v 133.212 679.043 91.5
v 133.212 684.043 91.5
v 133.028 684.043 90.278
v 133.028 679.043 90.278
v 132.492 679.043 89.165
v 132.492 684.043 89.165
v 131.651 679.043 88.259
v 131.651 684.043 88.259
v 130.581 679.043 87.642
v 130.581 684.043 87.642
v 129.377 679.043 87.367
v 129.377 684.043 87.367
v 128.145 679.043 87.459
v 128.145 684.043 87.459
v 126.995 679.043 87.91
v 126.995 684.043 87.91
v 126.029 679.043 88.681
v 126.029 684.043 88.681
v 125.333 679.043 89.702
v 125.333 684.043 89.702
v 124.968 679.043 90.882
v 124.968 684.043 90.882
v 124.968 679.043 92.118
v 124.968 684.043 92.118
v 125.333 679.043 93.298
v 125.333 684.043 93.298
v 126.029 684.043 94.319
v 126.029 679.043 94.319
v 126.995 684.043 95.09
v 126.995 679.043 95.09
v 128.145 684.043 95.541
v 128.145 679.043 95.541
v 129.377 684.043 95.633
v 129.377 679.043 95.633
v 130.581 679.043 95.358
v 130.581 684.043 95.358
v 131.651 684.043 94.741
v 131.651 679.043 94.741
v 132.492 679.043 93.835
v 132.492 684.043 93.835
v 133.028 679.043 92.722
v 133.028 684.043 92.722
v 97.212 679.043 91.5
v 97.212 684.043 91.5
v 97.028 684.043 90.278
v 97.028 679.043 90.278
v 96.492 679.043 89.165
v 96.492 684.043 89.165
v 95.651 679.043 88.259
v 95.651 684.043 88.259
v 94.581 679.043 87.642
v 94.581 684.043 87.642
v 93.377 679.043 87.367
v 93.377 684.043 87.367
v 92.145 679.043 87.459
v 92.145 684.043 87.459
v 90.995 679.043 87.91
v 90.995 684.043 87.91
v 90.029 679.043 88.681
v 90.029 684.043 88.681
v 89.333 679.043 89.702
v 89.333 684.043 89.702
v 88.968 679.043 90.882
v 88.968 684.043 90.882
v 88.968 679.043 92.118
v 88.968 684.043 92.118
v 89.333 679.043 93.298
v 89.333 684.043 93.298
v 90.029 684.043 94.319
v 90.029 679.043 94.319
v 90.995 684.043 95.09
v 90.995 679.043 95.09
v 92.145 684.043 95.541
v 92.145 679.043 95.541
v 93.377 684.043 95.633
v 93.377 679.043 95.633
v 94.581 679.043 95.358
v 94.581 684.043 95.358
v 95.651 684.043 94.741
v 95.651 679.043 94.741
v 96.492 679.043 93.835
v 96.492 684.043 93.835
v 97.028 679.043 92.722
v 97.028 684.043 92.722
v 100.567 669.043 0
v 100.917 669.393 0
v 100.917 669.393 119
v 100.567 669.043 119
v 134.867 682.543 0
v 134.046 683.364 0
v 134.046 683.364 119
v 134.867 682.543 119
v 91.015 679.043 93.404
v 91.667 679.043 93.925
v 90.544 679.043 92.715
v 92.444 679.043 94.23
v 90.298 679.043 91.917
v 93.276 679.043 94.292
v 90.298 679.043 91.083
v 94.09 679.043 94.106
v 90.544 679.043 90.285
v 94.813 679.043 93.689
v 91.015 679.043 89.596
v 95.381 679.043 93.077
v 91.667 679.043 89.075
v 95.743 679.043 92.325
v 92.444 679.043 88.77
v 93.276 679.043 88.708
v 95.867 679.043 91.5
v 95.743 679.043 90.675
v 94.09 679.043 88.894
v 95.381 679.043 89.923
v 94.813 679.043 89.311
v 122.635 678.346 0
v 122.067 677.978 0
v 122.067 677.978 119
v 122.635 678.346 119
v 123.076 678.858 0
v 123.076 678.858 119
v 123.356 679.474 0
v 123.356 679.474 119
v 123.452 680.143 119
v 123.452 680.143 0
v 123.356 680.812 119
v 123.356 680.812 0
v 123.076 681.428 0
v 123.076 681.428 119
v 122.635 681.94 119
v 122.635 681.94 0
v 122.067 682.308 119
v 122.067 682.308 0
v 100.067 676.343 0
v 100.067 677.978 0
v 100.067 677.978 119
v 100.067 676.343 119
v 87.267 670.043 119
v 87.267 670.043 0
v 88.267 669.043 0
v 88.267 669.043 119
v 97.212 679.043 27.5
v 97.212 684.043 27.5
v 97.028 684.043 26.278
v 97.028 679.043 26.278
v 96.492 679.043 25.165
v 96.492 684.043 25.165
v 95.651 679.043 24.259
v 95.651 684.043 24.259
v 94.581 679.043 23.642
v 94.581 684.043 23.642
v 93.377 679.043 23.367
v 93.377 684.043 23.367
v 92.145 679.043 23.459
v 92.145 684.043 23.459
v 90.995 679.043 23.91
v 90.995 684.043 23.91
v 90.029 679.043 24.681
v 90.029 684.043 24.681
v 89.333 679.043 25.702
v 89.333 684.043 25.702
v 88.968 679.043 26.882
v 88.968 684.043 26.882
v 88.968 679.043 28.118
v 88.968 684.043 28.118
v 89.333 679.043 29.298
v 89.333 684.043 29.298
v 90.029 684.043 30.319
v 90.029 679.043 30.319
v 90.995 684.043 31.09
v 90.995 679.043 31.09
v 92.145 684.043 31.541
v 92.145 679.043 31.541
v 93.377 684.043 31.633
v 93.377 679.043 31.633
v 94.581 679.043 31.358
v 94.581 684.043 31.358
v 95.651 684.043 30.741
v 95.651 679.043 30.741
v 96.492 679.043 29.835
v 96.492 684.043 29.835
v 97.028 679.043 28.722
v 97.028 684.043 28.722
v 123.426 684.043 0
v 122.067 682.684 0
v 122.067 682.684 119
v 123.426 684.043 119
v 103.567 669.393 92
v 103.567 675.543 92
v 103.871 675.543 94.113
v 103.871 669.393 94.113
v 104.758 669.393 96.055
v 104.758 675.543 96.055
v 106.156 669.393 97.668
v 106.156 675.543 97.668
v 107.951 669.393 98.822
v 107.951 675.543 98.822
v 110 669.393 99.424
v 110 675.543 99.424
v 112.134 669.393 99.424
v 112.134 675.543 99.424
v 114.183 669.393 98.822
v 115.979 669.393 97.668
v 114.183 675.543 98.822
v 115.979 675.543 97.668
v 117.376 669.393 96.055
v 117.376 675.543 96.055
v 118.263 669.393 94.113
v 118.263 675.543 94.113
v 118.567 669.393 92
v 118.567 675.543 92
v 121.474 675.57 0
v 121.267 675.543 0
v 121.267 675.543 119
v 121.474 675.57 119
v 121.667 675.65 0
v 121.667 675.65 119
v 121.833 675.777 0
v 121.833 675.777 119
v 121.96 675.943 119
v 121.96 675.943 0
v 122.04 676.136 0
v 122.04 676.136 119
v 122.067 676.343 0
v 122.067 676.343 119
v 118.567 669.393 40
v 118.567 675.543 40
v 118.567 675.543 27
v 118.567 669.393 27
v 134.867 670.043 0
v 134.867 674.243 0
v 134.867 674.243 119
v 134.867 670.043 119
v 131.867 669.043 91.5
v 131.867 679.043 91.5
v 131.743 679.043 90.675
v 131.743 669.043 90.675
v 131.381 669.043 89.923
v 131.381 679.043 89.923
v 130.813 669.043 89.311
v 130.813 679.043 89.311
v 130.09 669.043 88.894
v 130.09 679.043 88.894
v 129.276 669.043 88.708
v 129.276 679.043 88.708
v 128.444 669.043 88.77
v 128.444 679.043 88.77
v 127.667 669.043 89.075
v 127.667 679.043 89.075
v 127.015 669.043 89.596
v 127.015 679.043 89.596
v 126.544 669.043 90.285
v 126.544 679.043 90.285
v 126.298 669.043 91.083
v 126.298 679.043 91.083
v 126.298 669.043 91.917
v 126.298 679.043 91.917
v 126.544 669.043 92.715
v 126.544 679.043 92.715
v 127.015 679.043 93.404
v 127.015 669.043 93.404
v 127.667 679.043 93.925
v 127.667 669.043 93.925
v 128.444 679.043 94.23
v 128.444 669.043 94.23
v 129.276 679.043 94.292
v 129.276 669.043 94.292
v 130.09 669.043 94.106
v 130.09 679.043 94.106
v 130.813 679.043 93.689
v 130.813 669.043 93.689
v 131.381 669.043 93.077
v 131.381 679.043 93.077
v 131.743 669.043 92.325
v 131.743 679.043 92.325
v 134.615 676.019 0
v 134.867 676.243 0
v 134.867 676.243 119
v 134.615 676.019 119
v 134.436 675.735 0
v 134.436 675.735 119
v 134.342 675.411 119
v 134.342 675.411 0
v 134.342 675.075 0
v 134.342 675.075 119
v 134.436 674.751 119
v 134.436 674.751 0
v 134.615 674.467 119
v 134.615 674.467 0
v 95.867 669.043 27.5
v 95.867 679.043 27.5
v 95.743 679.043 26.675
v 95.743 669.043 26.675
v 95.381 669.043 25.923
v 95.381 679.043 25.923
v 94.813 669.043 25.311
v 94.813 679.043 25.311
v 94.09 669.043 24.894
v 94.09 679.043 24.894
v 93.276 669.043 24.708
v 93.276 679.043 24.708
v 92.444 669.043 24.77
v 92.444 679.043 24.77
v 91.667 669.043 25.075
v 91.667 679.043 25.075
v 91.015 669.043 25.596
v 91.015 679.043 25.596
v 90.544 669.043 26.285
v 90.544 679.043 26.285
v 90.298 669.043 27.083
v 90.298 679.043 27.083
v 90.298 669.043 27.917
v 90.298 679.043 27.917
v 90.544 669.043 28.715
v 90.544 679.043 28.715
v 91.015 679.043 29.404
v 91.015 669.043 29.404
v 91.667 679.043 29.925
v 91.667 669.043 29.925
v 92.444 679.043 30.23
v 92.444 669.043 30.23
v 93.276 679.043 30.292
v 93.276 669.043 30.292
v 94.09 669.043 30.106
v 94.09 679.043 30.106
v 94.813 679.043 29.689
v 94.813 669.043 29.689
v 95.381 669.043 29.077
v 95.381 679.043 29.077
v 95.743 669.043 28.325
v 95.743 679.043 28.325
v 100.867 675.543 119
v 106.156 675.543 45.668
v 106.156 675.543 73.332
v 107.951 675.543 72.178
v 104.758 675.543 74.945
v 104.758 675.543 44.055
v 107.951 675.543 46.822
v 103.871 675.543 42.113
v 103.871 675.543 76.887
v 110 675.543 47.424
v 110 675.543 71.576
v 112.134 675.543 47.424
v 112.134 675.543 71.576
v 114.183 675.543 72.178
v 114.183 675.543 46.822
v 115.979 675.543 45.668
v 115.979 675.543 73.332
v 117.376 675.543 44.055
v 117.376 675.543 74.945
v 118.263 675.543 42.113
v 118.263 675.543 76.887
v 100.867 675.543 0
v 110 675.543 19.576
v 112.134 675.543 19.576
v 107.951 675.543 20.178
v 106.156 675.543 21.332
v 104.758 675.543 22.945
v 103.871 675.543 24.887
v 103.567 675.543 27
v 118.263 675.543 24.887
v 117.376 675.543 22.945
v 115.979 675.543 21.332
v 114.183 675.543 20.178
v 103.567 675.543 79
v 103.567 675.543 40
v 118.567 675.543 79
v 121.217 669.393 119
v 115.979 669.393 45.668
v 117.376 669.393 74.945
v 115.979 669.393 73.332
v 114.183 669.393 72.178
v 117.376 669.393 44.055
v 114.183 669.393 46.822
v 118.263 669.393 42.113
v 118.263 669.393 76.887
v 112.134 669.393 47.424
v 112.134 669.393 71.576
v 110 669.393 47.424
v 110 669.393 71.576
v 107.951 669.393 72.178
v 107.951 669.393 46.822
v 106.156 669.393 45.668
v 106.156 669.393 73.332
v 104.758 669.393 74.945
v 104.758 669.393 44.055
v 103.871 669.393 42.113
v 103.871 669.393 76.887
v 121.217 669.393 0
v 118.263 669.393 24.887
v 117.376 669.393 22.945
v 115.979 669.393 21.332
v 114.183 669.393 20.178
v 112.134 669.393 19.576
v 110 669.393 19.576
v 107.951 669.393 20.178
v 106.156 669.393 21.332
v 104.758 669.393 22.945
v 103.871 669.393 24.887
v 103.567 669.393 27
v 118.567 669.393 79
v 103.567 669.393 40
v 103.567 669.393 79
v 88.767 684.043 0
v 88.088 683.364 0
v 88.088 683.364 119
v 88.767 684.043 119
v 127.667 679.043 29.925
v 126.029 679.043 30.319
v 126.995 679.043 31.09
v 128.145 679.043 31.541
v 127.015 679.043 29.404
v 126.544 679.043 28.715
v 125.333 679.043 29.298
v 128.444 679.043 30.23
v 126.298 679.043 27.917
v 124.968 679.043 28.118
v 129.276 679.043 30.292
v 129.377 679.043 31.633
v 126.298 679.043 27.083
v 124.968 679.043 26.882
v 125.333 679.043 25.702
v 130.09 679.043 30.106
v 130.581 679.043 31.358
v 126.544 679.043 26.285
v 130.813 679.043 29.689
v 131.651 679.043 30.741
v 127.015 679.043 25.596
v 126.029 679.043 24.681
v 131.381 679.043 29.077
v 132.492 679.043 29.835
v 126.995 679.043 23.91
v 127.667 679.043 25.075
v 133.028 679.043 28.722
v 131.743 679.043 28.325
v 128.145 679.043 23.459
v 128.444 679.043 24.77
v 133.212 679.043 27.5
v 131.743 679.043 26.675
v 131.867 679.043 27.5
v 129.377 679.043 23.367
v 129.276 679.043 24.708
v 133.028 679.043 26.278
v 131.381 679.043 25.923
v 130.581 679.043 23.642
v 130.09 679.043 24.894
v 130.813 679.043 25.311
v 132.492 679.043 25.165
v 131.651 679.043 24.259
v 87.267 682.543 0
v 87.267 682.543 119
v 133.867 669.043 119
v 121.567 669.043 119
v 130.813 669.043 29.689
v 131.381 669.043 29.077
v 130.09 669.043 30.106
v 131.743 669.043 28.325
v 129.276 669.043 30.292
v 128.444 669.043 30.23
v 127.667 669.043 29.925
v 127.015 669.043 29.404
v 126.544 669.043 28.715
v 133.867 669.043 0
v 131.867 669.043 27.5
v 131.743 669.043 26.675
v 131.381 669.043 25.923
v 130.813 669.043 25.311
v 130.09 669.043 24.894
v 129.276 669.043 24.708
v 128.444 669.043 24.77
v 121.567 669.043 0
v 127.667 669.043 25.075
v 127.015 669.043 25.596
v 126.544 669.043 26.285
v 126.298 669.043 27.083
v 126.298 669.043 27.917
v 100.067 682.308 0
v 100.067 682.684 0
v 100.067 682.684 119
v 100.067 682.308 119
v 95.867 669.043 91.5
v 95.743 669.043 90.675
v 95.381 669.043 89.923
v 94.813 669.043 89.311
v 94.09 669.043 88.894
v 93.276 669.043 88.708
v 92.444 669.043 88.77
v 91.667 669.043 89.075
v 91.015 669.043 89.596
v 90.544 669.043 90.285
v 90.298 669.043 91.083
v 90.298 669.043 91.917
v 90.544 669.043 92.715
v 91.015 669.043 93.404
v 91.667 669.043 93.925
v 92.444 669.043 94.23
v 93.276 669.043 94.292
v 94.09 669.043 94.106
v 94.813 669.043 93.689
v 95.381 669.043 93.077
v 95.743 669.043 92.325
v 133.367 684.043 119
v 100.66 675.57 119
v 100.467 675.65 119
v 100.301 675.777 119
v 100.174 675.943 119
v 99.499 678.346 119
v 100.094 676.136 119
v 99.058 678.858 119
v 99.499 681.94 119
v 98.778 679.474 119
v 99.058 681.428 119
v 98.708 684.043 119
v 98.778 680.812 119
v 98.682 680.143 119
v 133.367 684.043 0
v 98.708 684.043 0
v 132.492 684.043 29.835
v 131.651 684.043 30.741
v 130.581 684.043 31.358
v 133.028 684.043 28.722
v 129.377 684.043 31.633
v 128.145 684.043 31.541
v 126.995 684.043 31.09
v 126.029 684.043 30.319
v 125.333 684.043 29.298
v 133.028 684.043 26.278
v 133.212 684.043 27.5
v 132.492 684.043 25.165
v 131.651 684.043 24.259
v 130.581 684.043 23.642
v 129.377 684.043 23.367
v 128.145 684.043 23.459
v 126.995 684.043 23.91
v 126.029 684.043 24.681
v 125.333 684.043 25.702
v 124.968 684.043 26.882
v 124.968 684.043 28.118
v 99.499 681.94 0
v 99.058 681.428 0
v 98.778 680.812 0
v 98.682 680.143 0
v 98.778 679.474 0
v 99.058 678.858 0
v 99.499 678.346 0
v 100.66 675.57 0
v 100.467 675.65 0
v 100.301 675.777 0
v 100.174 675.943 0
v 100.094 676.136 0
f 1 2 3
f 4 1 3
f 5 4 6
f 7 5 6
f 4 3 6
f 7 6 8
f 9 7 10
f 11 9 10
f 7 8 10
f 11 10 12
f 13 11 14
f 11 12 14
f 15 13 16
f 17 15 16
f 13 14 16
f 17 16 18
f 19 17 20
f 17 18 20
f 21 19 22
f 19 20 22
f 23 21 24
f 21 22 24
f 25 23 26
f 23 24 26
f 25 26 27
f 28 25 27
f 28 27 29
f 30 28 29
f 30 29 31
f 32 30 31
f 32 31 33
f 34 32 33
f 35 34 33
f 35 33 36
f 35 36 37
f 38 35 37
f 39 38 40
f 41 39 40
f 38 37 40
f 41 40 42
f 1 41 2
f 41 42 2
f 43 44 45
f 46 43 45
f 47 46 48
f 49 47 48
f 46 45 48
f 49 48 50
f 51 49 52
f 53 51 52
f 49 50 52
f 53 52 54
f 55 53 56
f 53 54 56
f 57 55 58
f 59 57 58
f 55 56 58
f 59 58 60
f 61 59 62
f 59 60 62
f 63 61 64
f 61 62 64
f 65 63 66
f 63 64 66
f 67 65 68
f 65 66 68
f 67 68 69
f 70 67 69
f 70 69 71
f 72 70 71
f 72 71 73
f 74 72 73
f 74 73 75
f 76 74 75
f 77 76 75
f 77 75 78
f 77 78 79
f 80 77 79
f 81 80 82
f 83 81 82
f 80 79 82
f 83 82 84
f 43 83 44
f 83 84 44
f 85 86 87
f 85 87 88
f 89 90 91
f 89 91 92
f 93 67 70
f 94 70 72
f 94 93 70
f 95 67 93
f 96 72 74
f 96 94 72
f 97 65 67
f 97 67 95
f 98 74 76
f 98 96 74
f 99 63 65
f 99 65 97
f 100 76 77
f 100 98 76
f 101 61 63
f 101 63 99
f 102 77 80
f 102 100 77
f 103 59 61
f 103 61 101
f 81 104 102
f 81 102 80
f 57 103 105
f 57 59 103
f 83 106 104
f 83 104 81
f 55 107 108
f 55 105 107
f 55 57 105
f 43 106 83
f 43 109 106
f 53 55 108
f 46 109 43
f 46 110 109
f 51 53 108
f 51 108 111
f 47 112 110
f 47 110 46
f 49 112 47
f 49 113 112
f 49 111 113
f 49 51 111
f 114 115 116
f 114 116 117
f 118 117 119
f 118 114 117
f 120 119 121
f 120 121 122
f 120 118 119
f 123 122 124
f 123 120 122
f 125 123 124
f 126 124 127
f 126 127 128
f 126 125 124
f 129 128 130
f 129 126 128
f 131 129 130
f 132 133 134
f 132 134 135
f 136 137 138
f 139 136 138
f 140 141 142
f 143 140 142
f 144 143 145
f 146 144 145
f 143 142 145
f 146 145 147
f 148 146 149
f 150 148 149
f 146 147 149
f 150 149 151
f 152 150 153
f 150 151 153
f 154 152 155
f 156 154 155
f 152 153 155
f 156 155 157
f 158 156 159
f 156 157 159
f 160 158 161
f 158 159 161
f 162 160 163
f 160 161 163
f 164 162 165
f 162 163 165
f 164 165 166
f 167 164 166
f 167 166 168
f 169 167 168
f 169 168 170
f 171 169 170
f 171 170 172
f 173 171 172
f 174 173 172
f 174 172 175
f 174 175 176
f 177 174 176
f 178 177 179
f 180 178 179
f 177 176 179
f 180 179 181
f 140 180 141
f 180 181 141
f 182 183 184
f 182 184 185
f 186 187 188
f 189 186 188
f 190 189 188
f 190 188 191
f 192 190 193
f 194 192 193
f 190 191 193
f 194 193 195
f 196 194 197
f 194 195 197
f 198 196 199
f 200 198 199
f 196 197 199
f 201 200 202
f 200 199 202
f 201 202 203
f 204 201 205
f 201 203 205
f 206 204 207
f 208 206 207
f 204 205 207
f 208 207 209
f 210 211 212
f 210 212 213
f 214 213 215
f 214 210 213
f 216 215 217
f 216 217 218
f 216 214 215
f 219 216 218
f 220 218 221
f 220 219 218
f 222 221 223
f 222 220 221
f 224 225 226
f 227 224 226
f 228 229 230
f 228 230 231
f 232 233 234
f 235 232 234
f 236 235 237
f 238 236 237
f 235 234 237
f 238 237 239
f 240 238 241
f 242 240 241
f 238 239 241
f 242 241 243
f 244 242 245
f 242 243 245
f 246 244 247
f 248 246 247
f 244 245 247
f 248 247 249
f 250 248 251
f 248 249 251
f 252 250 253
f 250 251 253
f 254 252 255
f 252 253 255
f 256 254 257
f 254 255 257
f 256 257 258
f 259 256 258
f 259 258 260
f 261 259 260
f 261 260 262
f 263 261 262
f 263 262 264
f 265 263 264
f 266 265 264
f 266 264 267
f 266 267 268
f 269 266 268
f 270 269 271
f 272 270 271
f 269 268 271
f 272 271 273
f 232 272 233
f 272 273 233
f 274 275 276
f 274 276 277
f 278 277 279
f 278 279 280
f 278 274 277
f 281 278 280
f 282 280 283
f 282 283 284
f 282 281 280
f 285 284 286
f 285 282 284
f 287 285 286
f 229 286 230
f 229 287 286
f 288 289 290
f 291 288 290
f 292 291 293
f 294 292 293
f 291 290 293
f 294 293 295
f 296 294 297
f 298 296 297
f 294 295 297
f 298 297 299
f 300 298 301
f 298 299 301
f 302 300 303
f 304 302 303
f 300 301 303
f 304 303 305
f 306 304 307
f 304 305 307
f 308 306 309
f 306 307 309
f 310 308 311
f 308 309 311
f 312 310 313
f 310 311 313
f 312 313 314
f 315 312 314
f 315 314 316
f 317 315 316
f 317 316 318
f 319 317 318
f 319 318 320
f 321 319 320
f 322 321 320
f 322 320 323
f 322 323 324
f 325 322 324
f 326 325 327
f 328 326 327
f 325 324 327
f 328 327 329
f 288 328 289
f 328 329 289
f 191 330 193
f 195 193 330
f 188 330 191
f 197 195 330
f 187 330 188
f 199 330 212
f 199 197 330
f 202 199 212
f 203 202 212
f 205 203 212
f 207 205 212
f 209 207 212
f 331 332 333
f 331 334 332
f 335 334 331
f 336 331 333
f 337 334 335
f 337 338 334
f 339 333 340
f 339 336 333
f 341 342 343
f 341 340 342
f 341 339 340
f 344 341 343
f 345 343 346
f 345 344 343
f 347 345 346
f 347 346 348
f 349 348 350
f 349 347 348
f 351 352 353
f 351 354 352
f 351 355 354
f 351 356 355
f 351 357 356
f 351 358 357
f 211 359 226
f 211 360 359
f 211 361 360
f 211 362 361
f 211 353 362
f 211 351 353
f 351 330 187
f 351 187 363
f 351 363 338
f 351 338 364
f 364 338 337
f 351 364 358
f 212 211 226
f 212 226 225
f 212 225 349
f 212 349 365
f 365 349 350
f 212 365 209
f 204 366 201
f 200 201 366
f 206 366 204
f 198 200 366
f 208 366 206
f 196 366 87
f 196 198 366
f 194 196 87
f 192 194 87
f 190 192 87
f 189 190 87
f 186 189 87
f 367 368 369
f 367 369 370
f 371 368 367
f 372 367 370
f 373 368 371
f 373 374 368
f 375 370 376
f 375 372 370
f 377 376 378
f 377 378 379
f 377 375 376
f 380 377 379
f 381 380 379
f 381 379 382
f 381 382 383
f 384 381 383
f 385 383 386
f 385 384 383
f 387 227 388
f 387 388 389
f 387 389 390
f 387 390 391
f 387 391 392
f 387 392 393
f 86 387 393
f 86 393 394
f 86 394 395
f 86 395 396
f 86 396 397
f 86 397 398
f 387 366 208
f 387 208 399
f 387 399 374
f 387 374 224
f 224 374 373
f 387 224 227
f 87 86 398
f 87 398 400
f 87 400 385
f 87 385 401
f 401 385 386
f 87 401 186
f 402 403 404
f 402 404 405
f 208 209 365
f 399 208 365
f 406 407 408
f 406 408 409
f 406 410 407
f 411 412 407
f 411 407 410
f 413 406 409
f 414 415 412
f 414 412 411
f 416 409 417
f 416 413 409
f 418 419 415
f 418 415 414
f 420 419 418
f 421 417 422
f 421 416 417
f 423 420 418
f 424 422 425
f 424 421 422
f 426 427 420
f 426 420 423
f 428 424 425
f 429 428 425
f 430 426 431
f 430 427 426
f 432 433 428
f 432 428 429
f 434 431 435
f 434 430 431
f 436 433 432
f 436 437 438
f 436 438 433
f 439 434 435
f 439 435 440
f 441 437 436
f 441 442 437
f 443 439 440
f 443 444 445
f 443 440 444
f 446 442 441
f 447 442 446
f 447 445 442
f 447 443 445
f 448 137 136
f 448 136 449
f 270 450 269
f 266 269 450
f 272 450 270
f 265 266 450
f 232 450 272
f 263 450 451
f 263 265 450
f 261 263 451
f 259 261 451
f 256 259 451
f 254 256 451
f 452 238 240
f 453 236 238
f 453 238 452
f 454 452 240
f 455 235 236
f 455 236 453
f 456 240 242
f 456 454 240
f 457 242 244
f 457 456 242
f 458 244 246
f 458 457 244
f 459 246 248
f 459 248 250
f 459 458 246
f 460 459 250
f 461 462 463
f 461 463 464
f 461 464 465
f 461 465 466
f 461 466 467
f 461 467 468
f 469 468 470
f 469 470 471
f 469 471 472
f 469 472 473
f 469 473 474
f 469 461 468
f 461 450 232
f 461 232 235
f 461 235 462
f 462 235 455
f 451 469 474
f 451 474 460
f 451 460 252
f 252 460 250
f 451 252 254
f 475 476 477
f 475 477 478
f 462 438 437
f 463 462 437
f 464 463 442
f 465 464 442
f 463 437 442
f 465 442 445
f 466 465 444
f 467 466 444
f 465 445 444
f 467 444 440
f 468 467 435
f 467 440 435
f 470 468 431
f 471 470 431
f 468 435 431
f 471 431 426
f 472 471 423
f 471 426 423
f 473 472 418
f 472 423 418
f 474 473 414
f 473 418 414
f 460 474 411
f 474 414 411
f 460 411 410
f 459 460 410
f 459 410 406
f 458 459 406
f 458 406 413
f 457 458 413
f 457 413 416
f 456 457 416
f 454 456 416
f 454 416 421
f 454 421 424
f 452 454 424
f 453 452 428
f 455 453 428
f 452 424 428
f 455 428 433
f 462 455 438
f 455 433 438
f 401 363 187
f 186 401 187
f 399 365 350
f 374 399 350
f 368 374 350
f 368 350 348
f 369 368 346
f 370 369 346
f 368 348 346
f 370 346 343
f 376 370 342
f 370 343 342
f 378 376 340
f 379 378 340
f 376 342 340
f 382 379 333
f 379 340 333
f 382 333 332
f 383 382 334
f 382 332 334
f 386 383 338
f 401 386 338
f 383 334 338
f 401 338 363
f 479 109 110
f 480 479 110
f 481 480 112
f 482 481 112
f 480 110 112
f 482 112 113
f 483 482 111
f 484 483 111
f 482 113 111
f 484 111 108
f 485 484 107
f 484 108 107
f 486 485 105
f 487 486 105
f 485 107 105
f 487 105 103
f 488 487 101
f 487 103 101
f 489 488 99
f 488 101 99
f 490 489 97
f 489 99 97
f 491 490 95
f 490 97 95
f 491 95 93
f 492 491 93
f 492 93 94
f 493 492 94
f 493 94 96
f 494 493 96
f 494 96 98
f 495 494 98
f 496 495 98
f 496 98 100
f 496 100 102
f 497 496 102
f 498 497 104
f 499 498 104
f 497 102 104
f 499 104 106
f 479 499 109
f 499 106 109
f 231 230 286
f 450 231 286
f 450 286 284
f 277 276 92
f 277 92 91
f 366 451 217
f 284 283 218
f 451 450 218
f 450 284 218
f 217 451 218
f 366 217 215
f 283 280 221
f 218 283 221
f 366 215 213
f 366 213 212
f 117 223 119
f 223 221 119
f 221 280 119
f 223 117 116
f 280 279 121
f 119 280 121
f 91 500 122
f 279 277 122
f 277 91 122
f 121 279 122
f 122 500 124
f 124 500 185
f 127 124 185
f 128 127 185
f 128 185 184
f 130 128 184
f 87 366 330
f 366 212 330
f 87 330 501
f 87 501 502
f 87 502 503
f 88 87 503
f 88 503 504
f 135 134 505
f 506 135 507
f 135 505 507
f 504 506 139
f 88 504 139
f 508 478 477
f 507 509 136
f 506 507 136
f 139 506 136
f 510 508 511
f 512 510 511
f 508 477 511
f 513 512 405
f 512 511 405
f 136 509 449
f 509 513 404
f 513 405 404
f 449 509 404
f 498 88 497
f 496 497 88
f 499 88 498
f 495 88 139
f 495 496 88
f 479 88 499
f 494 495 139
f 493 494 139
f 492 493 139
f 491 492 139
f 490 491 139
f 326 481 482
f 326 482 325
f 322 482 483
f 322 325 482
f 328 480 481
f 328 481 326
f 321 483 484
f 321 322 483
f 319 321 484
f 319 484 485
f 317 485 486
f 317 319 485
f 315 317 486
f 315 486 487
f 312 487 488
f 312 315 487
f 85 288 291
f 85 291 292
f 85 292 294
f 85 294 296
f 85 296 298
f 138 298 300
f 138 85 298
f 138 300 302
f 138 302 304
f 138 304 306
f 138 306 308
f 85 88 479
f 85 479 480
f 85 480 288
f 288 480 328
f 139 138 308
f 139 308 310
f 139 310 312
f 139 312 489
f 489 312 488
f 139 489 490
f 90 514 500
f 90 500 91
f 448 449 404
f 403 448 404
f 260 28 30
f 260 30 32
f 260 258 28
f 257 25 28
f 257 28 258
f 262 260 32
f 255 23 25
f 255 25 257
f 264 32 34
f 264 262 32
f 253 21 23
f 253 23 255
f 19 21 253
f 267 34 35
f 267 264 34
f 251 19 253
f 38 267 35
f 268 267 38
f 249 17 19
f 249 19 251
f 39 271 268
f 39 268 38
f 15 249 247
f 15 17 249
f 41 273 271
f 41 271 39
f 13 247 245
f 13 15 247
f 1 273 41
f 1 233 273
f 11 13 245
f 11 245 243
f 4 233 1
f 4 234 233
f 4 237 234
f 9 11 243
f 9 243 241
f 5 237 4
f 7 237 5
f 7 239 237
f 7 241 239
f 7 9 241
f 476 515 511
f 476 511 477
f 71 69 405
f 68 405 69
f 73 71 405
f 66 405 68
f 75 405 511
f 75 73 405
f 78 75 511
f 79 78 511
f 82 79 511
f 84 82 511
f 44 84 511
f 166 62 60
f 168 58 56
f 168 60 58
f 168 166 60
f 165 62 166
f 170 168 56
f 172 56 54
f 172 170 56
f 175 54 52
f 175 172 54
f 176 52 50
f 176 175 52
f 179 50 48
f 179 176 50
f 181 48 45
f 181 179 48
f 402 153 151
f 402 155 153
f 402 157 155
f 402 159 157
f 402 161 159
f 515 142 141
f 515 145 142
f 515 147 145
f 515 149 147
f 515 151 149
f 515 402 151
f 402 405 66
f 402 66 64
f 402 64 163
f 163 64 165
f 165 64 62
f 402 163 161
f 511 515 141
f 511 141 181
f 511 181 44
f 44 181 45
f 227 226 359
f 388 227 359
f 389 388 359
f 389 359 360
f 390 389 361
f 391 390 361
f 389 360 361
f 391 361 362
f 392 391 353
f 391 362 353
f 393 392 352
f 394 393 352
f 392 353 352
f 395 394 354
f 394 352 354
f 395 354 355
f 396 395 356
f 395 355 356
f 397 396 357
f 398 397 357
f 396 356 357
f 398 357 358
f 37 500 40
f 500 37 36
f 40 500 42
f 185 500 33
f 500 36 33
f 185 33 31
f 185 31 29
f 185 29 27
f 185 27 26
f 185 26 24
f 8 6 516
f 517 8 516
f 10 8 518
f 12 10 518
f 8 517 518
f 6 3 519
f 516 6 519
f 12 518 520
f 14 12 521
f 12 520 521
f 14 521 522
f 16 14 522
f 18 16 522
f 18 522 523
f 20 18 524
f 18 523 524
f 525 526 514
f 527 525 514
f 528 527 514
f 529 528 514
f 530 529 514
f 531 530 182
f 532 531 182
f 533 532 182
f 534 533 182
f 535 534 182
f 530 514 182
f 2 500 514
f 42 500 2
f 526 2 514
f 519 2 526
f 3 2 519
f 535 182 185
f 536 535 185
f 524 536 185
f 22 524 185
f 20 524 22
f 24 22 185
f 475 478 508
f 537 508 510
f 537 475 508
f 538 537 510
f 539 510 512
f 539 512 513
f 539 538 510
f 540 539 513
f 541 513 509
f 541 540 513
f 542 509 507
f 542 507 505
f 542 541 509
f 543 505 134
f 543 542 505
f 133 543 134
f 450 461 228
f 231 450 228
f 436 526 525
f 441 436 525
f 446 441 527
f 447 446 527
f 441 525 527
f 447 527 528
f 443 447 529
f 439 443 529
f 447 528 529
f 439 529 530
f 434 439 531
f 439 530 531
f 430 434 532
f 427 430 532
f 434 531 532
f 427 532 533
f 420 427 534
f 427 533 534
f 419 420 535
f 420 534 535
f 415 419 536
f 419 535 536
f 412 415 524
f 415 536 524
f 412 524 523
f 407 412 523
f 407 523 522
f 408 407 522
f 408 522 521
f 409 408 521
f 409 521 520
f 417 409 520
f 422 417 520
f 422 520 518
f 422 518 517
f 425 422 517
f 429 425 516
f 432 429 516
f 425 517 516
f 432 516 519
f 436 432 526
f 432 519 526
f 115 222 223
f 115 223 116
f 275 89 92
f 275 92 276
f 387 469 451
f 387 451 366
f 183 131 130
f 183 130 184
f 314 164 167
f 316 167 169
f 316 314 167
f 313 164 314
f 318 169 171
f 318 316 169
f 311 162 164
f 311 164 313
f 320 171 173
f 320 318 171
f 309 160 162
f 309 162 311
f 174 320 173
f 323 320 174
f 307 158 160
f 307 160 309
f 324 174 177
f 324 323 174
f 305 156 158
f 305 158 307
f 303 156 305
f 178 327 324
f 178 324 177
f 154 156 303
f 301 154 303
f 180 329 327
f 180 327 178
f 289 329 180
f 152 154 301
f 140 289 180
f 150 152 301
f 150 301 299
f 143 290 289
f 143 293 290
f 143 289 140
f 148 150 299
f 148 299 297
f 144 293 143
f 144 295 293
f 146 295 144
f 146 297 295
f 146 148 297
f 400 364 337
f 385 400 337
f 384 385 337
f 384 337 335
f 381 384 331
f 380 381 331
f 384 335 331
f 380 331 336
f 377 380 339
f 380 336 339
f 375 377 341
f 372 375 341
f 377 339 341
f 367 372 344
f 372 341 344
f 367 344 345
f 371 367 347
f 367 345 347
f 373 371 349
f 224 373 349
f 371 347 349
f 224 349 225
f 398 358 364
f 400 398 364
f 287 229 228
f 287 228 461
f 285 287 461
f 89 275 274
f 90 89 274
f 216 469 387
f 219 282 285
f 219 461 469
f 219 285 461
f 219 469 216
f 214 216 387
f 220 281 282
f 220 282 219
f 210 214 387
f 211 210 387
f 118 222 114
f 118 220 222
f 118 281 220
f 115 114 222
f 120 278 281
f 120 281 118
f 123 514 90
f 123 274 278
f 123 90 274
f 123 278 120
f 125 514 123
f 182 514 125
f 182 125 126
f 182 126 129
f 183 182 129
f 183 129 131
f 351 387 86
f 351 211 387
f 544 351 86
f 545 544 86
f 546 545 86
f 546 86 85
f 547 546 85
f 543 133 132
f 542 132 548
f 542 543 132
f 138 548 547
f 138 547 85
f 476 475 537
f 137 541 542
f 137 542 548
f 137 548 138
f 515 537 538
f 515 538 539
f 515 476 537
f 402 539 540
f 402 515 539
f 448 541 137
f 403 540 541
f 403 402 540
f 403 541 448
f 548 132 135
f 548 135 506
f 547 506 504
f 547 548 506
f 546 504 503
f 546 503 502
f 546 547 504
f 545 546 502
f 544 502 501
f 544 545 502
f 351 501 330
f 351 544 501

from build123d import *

# Parameters (mm, degrees)
EXTRUDE_1_DEPTH     = 119
SKETCH_4_R          = 4.145
CUT_EXTRUDE_2_DEPTH = 5
SKETCH_7_R          = 2.8
CUT_EXTRUDE_3_DEPTH = 10
CUT_EXTRUDE_4_DEPTH = 10


with BuildPart() as part:
    # 草图1 → 凸台-拉伸1 (new body)
    with BuildSketch(Plane.XY):
        Polygon((100.067060811, 682.684424639), (88.767060811, 682.684424639), (88.087771489, 683.363713961), (88.767060811, 684.043003282), (98.708482167, 684.043003282), align=None)
        Polygon((88.767060811, 682.684424639), (88.767060811, 670.543003282), (87.767060811, 669.543003282), (87.267060811, 670.043003282), (87.267060811, 682.543003282), (88.087771489, 683.363713961), align=None)
        with BuildLine():
            ThreePointArc((100.067060811, 682.308234217), (98.682060811, 680.143003282), (100.067060811, 677.977772348))
            Line((100.067060811, 677.977772348), (100.067060811, 676.343003282))
            ThreePointArc((100.067060811, 676.343003282), (100.301375386, 675.777317857), (100.867060811, 675.543003282))
            Line((100.867060811, 675.543003282), (121.267060811, 675.543003282))
            ThreePointArc((121.267060811, 675.543003282), (121.832746236, 675.777317857), (122.067060811, 676.343003282))
            Line((122.067060811, 676.343003282), (122.067060811, 677.977772348))
            ThreePointArc((122.067060811, 677.977772348), (123.452060811, 680.143003282), (122.067060811, 682.308234217))
            Line((122.067060811, 682.308234217), (122.067060811, 682.684424639))
            Line((122.067060811, 682.684424639), (133.367060811, 682.684424639))
            Line((133.367060811, 682.684424639), (133.367060811, 670.543003282))
            Line((133.367060811, 670.543003282), (88.767060811, 670.543003282))
            Line((88.767060811, 670.543003282), (88.767060811, 682.684424639))
            Line((88.767060811, 682.684424639), (100.067060811, 682.684424639))
            Line((100.067060811, 682.684424639), (100.067060811, 682.308234217))
        make_face()
        Polygon((88.767060811, 670.543003282), (133.367060811, 670.543003282), (134.367060811, 669.543003282), (133.867060811, 669.043003282), (121.567060811, 669.043003282), (121.217060811, 669.393003282), (100.917060811, 669.393003282), (100.567060811, 669.043003282), (88.267060811, 669.043003282), (87.767060811, 669.543003282), align=None)
        Polygon((133.367060811, 682.684424639), (122.067060811, 682.684424639), (123.425639455, 684.043003282), (123.667060811, 684.043003282), (133.367060811, 684.043003282), (134.046350133, 683.363713961), align=None)
        with BuildLine():
            ThreePointArc((134.867060811, 676.243003282), (134.330385769, 675.243003282), (134.867060811, 674.243003282))
            Line((134.867060811, 674.243003282), (134.867060811, 670.043003282))
            Line((134.867060811, 670.043003282), (134.367060811, 669.543003282))
            Line((134.367060811, 669.543003282), (133.367060811, 670.543003282))
            Line((133.367060811, 670.543003282), (133.367060811, 682.684424639))
            Line((133.367060811, 682.684424639), (134.046350133, 683.363713961))
            Line((134.046350133, 683.363713961), (134.867060811, 682.543003282))
            Line((134.867060811, 682.543003282), (134.867060811, 676.243003282))
        make_face()
    extrude(amount=EXTRUDE_1_DEPTH)

    # 草图4 → 切除-拉伸2 (cut)
    with BuildSketch(Plane(origin=(0, 684.043003282, 0), x_dir=(1, 0, 0), z_dir=(0, 1, 0))):
        with Locations((93.067060811, -27.5)):
            Circle(SKETCH_4_R)
        with Locations((129.067060811, -27.5)):
            Circle(SKETCH_4_R)
        with Locations((93.067060811, -91.5)):
            Circle(SKETCH_4_R)
        with Locations((129.067060811, -91.5)):
            Circle(SKETCH_4_R)
    extrude(amount=-CUT_EXTRUDE_2_DEPTH, mode=Mode.SUBTRACT)

    # 草图7 → 切除-拉伸3 (cut)
    with BuildSketch(Plane(origin=(0, 679.043003282, 0), x_dir=(1, 0, 0), z_dir=(0, 1, 0))):
        with Locations((93.067060811, -27.5)):
            Circle(SKETCH_7_R)
        with Locations((93.067060811, -91.5)):
            Circle(SKETCH_7_R)
        with Locations((129.067060811, -91.5)):
            Circle(SKETCH_7_R)
        with Locations((129.067060811, -27.5)):
            Circle(SKETCH_7_R)
    extrude(amount=-CUT_EXTRUDE_3_DEPTH, mode=Mode.SUBTRACT)

    # 草图8 → 切除-拉伸4 (cut)
    with BuildSketch(Plane(origin=(0, 675.543003282, 0), x_dir=(1, 0, 0), z_dir=(0, 1, 0))):
        with BuildLine():
            Line((103.567060811, -27), (103.567060811, -40))
            ThreePointArc((103.567060811, -40), (111.067060811, -47.5), (118.567060811, -40))
            Line((118.567060811, -40), (118.567060811, -27))
            ThreePointArc((118.567060811, -27), (111.067060811, -19.5), (103.567060811, -27))
        make_face()
        with BuildLine():
            Line((103.567060811, -79), (103.567060811, -92))
            ThreePointArc((103.567060811, -92), (111.067060811, -99.5), (118.567060811, -92))
            Line((118.567060811, -92), (118.567060811, -79))
            ThreePointArc((118.567060811, -79), (111.067060811, -71.5), (103.567060811, -79))
        make_face()
    extrude(amount=-CUT_EXTRUDE_4_DEPTH, mode=Mode.SUBTRACT)


solid = part.part
